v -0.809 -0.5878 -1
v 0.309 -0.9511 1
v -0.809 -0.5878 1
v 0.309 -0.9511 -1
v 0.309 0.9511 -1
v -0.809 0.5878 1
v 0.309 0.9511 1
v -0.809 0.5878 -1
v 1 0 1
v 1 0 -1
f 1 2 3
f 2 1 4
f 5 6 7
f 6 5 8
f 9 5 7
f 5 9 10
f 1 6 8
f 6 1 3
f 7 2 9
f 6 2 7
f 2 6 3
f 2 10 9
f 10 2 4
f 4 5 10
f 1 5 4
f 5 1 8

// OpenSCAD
module hook2(size, width, height) {
	difference() {
		cylinder(r = 1, h = height, center = true);
		cylinder(r = 1 - width,	 h = height * 2, center = true);
		translate([0, size / 2, 0])
			#cube([3, 1, height * 2], true);
	}
}

hook2(8, 1, 2);
